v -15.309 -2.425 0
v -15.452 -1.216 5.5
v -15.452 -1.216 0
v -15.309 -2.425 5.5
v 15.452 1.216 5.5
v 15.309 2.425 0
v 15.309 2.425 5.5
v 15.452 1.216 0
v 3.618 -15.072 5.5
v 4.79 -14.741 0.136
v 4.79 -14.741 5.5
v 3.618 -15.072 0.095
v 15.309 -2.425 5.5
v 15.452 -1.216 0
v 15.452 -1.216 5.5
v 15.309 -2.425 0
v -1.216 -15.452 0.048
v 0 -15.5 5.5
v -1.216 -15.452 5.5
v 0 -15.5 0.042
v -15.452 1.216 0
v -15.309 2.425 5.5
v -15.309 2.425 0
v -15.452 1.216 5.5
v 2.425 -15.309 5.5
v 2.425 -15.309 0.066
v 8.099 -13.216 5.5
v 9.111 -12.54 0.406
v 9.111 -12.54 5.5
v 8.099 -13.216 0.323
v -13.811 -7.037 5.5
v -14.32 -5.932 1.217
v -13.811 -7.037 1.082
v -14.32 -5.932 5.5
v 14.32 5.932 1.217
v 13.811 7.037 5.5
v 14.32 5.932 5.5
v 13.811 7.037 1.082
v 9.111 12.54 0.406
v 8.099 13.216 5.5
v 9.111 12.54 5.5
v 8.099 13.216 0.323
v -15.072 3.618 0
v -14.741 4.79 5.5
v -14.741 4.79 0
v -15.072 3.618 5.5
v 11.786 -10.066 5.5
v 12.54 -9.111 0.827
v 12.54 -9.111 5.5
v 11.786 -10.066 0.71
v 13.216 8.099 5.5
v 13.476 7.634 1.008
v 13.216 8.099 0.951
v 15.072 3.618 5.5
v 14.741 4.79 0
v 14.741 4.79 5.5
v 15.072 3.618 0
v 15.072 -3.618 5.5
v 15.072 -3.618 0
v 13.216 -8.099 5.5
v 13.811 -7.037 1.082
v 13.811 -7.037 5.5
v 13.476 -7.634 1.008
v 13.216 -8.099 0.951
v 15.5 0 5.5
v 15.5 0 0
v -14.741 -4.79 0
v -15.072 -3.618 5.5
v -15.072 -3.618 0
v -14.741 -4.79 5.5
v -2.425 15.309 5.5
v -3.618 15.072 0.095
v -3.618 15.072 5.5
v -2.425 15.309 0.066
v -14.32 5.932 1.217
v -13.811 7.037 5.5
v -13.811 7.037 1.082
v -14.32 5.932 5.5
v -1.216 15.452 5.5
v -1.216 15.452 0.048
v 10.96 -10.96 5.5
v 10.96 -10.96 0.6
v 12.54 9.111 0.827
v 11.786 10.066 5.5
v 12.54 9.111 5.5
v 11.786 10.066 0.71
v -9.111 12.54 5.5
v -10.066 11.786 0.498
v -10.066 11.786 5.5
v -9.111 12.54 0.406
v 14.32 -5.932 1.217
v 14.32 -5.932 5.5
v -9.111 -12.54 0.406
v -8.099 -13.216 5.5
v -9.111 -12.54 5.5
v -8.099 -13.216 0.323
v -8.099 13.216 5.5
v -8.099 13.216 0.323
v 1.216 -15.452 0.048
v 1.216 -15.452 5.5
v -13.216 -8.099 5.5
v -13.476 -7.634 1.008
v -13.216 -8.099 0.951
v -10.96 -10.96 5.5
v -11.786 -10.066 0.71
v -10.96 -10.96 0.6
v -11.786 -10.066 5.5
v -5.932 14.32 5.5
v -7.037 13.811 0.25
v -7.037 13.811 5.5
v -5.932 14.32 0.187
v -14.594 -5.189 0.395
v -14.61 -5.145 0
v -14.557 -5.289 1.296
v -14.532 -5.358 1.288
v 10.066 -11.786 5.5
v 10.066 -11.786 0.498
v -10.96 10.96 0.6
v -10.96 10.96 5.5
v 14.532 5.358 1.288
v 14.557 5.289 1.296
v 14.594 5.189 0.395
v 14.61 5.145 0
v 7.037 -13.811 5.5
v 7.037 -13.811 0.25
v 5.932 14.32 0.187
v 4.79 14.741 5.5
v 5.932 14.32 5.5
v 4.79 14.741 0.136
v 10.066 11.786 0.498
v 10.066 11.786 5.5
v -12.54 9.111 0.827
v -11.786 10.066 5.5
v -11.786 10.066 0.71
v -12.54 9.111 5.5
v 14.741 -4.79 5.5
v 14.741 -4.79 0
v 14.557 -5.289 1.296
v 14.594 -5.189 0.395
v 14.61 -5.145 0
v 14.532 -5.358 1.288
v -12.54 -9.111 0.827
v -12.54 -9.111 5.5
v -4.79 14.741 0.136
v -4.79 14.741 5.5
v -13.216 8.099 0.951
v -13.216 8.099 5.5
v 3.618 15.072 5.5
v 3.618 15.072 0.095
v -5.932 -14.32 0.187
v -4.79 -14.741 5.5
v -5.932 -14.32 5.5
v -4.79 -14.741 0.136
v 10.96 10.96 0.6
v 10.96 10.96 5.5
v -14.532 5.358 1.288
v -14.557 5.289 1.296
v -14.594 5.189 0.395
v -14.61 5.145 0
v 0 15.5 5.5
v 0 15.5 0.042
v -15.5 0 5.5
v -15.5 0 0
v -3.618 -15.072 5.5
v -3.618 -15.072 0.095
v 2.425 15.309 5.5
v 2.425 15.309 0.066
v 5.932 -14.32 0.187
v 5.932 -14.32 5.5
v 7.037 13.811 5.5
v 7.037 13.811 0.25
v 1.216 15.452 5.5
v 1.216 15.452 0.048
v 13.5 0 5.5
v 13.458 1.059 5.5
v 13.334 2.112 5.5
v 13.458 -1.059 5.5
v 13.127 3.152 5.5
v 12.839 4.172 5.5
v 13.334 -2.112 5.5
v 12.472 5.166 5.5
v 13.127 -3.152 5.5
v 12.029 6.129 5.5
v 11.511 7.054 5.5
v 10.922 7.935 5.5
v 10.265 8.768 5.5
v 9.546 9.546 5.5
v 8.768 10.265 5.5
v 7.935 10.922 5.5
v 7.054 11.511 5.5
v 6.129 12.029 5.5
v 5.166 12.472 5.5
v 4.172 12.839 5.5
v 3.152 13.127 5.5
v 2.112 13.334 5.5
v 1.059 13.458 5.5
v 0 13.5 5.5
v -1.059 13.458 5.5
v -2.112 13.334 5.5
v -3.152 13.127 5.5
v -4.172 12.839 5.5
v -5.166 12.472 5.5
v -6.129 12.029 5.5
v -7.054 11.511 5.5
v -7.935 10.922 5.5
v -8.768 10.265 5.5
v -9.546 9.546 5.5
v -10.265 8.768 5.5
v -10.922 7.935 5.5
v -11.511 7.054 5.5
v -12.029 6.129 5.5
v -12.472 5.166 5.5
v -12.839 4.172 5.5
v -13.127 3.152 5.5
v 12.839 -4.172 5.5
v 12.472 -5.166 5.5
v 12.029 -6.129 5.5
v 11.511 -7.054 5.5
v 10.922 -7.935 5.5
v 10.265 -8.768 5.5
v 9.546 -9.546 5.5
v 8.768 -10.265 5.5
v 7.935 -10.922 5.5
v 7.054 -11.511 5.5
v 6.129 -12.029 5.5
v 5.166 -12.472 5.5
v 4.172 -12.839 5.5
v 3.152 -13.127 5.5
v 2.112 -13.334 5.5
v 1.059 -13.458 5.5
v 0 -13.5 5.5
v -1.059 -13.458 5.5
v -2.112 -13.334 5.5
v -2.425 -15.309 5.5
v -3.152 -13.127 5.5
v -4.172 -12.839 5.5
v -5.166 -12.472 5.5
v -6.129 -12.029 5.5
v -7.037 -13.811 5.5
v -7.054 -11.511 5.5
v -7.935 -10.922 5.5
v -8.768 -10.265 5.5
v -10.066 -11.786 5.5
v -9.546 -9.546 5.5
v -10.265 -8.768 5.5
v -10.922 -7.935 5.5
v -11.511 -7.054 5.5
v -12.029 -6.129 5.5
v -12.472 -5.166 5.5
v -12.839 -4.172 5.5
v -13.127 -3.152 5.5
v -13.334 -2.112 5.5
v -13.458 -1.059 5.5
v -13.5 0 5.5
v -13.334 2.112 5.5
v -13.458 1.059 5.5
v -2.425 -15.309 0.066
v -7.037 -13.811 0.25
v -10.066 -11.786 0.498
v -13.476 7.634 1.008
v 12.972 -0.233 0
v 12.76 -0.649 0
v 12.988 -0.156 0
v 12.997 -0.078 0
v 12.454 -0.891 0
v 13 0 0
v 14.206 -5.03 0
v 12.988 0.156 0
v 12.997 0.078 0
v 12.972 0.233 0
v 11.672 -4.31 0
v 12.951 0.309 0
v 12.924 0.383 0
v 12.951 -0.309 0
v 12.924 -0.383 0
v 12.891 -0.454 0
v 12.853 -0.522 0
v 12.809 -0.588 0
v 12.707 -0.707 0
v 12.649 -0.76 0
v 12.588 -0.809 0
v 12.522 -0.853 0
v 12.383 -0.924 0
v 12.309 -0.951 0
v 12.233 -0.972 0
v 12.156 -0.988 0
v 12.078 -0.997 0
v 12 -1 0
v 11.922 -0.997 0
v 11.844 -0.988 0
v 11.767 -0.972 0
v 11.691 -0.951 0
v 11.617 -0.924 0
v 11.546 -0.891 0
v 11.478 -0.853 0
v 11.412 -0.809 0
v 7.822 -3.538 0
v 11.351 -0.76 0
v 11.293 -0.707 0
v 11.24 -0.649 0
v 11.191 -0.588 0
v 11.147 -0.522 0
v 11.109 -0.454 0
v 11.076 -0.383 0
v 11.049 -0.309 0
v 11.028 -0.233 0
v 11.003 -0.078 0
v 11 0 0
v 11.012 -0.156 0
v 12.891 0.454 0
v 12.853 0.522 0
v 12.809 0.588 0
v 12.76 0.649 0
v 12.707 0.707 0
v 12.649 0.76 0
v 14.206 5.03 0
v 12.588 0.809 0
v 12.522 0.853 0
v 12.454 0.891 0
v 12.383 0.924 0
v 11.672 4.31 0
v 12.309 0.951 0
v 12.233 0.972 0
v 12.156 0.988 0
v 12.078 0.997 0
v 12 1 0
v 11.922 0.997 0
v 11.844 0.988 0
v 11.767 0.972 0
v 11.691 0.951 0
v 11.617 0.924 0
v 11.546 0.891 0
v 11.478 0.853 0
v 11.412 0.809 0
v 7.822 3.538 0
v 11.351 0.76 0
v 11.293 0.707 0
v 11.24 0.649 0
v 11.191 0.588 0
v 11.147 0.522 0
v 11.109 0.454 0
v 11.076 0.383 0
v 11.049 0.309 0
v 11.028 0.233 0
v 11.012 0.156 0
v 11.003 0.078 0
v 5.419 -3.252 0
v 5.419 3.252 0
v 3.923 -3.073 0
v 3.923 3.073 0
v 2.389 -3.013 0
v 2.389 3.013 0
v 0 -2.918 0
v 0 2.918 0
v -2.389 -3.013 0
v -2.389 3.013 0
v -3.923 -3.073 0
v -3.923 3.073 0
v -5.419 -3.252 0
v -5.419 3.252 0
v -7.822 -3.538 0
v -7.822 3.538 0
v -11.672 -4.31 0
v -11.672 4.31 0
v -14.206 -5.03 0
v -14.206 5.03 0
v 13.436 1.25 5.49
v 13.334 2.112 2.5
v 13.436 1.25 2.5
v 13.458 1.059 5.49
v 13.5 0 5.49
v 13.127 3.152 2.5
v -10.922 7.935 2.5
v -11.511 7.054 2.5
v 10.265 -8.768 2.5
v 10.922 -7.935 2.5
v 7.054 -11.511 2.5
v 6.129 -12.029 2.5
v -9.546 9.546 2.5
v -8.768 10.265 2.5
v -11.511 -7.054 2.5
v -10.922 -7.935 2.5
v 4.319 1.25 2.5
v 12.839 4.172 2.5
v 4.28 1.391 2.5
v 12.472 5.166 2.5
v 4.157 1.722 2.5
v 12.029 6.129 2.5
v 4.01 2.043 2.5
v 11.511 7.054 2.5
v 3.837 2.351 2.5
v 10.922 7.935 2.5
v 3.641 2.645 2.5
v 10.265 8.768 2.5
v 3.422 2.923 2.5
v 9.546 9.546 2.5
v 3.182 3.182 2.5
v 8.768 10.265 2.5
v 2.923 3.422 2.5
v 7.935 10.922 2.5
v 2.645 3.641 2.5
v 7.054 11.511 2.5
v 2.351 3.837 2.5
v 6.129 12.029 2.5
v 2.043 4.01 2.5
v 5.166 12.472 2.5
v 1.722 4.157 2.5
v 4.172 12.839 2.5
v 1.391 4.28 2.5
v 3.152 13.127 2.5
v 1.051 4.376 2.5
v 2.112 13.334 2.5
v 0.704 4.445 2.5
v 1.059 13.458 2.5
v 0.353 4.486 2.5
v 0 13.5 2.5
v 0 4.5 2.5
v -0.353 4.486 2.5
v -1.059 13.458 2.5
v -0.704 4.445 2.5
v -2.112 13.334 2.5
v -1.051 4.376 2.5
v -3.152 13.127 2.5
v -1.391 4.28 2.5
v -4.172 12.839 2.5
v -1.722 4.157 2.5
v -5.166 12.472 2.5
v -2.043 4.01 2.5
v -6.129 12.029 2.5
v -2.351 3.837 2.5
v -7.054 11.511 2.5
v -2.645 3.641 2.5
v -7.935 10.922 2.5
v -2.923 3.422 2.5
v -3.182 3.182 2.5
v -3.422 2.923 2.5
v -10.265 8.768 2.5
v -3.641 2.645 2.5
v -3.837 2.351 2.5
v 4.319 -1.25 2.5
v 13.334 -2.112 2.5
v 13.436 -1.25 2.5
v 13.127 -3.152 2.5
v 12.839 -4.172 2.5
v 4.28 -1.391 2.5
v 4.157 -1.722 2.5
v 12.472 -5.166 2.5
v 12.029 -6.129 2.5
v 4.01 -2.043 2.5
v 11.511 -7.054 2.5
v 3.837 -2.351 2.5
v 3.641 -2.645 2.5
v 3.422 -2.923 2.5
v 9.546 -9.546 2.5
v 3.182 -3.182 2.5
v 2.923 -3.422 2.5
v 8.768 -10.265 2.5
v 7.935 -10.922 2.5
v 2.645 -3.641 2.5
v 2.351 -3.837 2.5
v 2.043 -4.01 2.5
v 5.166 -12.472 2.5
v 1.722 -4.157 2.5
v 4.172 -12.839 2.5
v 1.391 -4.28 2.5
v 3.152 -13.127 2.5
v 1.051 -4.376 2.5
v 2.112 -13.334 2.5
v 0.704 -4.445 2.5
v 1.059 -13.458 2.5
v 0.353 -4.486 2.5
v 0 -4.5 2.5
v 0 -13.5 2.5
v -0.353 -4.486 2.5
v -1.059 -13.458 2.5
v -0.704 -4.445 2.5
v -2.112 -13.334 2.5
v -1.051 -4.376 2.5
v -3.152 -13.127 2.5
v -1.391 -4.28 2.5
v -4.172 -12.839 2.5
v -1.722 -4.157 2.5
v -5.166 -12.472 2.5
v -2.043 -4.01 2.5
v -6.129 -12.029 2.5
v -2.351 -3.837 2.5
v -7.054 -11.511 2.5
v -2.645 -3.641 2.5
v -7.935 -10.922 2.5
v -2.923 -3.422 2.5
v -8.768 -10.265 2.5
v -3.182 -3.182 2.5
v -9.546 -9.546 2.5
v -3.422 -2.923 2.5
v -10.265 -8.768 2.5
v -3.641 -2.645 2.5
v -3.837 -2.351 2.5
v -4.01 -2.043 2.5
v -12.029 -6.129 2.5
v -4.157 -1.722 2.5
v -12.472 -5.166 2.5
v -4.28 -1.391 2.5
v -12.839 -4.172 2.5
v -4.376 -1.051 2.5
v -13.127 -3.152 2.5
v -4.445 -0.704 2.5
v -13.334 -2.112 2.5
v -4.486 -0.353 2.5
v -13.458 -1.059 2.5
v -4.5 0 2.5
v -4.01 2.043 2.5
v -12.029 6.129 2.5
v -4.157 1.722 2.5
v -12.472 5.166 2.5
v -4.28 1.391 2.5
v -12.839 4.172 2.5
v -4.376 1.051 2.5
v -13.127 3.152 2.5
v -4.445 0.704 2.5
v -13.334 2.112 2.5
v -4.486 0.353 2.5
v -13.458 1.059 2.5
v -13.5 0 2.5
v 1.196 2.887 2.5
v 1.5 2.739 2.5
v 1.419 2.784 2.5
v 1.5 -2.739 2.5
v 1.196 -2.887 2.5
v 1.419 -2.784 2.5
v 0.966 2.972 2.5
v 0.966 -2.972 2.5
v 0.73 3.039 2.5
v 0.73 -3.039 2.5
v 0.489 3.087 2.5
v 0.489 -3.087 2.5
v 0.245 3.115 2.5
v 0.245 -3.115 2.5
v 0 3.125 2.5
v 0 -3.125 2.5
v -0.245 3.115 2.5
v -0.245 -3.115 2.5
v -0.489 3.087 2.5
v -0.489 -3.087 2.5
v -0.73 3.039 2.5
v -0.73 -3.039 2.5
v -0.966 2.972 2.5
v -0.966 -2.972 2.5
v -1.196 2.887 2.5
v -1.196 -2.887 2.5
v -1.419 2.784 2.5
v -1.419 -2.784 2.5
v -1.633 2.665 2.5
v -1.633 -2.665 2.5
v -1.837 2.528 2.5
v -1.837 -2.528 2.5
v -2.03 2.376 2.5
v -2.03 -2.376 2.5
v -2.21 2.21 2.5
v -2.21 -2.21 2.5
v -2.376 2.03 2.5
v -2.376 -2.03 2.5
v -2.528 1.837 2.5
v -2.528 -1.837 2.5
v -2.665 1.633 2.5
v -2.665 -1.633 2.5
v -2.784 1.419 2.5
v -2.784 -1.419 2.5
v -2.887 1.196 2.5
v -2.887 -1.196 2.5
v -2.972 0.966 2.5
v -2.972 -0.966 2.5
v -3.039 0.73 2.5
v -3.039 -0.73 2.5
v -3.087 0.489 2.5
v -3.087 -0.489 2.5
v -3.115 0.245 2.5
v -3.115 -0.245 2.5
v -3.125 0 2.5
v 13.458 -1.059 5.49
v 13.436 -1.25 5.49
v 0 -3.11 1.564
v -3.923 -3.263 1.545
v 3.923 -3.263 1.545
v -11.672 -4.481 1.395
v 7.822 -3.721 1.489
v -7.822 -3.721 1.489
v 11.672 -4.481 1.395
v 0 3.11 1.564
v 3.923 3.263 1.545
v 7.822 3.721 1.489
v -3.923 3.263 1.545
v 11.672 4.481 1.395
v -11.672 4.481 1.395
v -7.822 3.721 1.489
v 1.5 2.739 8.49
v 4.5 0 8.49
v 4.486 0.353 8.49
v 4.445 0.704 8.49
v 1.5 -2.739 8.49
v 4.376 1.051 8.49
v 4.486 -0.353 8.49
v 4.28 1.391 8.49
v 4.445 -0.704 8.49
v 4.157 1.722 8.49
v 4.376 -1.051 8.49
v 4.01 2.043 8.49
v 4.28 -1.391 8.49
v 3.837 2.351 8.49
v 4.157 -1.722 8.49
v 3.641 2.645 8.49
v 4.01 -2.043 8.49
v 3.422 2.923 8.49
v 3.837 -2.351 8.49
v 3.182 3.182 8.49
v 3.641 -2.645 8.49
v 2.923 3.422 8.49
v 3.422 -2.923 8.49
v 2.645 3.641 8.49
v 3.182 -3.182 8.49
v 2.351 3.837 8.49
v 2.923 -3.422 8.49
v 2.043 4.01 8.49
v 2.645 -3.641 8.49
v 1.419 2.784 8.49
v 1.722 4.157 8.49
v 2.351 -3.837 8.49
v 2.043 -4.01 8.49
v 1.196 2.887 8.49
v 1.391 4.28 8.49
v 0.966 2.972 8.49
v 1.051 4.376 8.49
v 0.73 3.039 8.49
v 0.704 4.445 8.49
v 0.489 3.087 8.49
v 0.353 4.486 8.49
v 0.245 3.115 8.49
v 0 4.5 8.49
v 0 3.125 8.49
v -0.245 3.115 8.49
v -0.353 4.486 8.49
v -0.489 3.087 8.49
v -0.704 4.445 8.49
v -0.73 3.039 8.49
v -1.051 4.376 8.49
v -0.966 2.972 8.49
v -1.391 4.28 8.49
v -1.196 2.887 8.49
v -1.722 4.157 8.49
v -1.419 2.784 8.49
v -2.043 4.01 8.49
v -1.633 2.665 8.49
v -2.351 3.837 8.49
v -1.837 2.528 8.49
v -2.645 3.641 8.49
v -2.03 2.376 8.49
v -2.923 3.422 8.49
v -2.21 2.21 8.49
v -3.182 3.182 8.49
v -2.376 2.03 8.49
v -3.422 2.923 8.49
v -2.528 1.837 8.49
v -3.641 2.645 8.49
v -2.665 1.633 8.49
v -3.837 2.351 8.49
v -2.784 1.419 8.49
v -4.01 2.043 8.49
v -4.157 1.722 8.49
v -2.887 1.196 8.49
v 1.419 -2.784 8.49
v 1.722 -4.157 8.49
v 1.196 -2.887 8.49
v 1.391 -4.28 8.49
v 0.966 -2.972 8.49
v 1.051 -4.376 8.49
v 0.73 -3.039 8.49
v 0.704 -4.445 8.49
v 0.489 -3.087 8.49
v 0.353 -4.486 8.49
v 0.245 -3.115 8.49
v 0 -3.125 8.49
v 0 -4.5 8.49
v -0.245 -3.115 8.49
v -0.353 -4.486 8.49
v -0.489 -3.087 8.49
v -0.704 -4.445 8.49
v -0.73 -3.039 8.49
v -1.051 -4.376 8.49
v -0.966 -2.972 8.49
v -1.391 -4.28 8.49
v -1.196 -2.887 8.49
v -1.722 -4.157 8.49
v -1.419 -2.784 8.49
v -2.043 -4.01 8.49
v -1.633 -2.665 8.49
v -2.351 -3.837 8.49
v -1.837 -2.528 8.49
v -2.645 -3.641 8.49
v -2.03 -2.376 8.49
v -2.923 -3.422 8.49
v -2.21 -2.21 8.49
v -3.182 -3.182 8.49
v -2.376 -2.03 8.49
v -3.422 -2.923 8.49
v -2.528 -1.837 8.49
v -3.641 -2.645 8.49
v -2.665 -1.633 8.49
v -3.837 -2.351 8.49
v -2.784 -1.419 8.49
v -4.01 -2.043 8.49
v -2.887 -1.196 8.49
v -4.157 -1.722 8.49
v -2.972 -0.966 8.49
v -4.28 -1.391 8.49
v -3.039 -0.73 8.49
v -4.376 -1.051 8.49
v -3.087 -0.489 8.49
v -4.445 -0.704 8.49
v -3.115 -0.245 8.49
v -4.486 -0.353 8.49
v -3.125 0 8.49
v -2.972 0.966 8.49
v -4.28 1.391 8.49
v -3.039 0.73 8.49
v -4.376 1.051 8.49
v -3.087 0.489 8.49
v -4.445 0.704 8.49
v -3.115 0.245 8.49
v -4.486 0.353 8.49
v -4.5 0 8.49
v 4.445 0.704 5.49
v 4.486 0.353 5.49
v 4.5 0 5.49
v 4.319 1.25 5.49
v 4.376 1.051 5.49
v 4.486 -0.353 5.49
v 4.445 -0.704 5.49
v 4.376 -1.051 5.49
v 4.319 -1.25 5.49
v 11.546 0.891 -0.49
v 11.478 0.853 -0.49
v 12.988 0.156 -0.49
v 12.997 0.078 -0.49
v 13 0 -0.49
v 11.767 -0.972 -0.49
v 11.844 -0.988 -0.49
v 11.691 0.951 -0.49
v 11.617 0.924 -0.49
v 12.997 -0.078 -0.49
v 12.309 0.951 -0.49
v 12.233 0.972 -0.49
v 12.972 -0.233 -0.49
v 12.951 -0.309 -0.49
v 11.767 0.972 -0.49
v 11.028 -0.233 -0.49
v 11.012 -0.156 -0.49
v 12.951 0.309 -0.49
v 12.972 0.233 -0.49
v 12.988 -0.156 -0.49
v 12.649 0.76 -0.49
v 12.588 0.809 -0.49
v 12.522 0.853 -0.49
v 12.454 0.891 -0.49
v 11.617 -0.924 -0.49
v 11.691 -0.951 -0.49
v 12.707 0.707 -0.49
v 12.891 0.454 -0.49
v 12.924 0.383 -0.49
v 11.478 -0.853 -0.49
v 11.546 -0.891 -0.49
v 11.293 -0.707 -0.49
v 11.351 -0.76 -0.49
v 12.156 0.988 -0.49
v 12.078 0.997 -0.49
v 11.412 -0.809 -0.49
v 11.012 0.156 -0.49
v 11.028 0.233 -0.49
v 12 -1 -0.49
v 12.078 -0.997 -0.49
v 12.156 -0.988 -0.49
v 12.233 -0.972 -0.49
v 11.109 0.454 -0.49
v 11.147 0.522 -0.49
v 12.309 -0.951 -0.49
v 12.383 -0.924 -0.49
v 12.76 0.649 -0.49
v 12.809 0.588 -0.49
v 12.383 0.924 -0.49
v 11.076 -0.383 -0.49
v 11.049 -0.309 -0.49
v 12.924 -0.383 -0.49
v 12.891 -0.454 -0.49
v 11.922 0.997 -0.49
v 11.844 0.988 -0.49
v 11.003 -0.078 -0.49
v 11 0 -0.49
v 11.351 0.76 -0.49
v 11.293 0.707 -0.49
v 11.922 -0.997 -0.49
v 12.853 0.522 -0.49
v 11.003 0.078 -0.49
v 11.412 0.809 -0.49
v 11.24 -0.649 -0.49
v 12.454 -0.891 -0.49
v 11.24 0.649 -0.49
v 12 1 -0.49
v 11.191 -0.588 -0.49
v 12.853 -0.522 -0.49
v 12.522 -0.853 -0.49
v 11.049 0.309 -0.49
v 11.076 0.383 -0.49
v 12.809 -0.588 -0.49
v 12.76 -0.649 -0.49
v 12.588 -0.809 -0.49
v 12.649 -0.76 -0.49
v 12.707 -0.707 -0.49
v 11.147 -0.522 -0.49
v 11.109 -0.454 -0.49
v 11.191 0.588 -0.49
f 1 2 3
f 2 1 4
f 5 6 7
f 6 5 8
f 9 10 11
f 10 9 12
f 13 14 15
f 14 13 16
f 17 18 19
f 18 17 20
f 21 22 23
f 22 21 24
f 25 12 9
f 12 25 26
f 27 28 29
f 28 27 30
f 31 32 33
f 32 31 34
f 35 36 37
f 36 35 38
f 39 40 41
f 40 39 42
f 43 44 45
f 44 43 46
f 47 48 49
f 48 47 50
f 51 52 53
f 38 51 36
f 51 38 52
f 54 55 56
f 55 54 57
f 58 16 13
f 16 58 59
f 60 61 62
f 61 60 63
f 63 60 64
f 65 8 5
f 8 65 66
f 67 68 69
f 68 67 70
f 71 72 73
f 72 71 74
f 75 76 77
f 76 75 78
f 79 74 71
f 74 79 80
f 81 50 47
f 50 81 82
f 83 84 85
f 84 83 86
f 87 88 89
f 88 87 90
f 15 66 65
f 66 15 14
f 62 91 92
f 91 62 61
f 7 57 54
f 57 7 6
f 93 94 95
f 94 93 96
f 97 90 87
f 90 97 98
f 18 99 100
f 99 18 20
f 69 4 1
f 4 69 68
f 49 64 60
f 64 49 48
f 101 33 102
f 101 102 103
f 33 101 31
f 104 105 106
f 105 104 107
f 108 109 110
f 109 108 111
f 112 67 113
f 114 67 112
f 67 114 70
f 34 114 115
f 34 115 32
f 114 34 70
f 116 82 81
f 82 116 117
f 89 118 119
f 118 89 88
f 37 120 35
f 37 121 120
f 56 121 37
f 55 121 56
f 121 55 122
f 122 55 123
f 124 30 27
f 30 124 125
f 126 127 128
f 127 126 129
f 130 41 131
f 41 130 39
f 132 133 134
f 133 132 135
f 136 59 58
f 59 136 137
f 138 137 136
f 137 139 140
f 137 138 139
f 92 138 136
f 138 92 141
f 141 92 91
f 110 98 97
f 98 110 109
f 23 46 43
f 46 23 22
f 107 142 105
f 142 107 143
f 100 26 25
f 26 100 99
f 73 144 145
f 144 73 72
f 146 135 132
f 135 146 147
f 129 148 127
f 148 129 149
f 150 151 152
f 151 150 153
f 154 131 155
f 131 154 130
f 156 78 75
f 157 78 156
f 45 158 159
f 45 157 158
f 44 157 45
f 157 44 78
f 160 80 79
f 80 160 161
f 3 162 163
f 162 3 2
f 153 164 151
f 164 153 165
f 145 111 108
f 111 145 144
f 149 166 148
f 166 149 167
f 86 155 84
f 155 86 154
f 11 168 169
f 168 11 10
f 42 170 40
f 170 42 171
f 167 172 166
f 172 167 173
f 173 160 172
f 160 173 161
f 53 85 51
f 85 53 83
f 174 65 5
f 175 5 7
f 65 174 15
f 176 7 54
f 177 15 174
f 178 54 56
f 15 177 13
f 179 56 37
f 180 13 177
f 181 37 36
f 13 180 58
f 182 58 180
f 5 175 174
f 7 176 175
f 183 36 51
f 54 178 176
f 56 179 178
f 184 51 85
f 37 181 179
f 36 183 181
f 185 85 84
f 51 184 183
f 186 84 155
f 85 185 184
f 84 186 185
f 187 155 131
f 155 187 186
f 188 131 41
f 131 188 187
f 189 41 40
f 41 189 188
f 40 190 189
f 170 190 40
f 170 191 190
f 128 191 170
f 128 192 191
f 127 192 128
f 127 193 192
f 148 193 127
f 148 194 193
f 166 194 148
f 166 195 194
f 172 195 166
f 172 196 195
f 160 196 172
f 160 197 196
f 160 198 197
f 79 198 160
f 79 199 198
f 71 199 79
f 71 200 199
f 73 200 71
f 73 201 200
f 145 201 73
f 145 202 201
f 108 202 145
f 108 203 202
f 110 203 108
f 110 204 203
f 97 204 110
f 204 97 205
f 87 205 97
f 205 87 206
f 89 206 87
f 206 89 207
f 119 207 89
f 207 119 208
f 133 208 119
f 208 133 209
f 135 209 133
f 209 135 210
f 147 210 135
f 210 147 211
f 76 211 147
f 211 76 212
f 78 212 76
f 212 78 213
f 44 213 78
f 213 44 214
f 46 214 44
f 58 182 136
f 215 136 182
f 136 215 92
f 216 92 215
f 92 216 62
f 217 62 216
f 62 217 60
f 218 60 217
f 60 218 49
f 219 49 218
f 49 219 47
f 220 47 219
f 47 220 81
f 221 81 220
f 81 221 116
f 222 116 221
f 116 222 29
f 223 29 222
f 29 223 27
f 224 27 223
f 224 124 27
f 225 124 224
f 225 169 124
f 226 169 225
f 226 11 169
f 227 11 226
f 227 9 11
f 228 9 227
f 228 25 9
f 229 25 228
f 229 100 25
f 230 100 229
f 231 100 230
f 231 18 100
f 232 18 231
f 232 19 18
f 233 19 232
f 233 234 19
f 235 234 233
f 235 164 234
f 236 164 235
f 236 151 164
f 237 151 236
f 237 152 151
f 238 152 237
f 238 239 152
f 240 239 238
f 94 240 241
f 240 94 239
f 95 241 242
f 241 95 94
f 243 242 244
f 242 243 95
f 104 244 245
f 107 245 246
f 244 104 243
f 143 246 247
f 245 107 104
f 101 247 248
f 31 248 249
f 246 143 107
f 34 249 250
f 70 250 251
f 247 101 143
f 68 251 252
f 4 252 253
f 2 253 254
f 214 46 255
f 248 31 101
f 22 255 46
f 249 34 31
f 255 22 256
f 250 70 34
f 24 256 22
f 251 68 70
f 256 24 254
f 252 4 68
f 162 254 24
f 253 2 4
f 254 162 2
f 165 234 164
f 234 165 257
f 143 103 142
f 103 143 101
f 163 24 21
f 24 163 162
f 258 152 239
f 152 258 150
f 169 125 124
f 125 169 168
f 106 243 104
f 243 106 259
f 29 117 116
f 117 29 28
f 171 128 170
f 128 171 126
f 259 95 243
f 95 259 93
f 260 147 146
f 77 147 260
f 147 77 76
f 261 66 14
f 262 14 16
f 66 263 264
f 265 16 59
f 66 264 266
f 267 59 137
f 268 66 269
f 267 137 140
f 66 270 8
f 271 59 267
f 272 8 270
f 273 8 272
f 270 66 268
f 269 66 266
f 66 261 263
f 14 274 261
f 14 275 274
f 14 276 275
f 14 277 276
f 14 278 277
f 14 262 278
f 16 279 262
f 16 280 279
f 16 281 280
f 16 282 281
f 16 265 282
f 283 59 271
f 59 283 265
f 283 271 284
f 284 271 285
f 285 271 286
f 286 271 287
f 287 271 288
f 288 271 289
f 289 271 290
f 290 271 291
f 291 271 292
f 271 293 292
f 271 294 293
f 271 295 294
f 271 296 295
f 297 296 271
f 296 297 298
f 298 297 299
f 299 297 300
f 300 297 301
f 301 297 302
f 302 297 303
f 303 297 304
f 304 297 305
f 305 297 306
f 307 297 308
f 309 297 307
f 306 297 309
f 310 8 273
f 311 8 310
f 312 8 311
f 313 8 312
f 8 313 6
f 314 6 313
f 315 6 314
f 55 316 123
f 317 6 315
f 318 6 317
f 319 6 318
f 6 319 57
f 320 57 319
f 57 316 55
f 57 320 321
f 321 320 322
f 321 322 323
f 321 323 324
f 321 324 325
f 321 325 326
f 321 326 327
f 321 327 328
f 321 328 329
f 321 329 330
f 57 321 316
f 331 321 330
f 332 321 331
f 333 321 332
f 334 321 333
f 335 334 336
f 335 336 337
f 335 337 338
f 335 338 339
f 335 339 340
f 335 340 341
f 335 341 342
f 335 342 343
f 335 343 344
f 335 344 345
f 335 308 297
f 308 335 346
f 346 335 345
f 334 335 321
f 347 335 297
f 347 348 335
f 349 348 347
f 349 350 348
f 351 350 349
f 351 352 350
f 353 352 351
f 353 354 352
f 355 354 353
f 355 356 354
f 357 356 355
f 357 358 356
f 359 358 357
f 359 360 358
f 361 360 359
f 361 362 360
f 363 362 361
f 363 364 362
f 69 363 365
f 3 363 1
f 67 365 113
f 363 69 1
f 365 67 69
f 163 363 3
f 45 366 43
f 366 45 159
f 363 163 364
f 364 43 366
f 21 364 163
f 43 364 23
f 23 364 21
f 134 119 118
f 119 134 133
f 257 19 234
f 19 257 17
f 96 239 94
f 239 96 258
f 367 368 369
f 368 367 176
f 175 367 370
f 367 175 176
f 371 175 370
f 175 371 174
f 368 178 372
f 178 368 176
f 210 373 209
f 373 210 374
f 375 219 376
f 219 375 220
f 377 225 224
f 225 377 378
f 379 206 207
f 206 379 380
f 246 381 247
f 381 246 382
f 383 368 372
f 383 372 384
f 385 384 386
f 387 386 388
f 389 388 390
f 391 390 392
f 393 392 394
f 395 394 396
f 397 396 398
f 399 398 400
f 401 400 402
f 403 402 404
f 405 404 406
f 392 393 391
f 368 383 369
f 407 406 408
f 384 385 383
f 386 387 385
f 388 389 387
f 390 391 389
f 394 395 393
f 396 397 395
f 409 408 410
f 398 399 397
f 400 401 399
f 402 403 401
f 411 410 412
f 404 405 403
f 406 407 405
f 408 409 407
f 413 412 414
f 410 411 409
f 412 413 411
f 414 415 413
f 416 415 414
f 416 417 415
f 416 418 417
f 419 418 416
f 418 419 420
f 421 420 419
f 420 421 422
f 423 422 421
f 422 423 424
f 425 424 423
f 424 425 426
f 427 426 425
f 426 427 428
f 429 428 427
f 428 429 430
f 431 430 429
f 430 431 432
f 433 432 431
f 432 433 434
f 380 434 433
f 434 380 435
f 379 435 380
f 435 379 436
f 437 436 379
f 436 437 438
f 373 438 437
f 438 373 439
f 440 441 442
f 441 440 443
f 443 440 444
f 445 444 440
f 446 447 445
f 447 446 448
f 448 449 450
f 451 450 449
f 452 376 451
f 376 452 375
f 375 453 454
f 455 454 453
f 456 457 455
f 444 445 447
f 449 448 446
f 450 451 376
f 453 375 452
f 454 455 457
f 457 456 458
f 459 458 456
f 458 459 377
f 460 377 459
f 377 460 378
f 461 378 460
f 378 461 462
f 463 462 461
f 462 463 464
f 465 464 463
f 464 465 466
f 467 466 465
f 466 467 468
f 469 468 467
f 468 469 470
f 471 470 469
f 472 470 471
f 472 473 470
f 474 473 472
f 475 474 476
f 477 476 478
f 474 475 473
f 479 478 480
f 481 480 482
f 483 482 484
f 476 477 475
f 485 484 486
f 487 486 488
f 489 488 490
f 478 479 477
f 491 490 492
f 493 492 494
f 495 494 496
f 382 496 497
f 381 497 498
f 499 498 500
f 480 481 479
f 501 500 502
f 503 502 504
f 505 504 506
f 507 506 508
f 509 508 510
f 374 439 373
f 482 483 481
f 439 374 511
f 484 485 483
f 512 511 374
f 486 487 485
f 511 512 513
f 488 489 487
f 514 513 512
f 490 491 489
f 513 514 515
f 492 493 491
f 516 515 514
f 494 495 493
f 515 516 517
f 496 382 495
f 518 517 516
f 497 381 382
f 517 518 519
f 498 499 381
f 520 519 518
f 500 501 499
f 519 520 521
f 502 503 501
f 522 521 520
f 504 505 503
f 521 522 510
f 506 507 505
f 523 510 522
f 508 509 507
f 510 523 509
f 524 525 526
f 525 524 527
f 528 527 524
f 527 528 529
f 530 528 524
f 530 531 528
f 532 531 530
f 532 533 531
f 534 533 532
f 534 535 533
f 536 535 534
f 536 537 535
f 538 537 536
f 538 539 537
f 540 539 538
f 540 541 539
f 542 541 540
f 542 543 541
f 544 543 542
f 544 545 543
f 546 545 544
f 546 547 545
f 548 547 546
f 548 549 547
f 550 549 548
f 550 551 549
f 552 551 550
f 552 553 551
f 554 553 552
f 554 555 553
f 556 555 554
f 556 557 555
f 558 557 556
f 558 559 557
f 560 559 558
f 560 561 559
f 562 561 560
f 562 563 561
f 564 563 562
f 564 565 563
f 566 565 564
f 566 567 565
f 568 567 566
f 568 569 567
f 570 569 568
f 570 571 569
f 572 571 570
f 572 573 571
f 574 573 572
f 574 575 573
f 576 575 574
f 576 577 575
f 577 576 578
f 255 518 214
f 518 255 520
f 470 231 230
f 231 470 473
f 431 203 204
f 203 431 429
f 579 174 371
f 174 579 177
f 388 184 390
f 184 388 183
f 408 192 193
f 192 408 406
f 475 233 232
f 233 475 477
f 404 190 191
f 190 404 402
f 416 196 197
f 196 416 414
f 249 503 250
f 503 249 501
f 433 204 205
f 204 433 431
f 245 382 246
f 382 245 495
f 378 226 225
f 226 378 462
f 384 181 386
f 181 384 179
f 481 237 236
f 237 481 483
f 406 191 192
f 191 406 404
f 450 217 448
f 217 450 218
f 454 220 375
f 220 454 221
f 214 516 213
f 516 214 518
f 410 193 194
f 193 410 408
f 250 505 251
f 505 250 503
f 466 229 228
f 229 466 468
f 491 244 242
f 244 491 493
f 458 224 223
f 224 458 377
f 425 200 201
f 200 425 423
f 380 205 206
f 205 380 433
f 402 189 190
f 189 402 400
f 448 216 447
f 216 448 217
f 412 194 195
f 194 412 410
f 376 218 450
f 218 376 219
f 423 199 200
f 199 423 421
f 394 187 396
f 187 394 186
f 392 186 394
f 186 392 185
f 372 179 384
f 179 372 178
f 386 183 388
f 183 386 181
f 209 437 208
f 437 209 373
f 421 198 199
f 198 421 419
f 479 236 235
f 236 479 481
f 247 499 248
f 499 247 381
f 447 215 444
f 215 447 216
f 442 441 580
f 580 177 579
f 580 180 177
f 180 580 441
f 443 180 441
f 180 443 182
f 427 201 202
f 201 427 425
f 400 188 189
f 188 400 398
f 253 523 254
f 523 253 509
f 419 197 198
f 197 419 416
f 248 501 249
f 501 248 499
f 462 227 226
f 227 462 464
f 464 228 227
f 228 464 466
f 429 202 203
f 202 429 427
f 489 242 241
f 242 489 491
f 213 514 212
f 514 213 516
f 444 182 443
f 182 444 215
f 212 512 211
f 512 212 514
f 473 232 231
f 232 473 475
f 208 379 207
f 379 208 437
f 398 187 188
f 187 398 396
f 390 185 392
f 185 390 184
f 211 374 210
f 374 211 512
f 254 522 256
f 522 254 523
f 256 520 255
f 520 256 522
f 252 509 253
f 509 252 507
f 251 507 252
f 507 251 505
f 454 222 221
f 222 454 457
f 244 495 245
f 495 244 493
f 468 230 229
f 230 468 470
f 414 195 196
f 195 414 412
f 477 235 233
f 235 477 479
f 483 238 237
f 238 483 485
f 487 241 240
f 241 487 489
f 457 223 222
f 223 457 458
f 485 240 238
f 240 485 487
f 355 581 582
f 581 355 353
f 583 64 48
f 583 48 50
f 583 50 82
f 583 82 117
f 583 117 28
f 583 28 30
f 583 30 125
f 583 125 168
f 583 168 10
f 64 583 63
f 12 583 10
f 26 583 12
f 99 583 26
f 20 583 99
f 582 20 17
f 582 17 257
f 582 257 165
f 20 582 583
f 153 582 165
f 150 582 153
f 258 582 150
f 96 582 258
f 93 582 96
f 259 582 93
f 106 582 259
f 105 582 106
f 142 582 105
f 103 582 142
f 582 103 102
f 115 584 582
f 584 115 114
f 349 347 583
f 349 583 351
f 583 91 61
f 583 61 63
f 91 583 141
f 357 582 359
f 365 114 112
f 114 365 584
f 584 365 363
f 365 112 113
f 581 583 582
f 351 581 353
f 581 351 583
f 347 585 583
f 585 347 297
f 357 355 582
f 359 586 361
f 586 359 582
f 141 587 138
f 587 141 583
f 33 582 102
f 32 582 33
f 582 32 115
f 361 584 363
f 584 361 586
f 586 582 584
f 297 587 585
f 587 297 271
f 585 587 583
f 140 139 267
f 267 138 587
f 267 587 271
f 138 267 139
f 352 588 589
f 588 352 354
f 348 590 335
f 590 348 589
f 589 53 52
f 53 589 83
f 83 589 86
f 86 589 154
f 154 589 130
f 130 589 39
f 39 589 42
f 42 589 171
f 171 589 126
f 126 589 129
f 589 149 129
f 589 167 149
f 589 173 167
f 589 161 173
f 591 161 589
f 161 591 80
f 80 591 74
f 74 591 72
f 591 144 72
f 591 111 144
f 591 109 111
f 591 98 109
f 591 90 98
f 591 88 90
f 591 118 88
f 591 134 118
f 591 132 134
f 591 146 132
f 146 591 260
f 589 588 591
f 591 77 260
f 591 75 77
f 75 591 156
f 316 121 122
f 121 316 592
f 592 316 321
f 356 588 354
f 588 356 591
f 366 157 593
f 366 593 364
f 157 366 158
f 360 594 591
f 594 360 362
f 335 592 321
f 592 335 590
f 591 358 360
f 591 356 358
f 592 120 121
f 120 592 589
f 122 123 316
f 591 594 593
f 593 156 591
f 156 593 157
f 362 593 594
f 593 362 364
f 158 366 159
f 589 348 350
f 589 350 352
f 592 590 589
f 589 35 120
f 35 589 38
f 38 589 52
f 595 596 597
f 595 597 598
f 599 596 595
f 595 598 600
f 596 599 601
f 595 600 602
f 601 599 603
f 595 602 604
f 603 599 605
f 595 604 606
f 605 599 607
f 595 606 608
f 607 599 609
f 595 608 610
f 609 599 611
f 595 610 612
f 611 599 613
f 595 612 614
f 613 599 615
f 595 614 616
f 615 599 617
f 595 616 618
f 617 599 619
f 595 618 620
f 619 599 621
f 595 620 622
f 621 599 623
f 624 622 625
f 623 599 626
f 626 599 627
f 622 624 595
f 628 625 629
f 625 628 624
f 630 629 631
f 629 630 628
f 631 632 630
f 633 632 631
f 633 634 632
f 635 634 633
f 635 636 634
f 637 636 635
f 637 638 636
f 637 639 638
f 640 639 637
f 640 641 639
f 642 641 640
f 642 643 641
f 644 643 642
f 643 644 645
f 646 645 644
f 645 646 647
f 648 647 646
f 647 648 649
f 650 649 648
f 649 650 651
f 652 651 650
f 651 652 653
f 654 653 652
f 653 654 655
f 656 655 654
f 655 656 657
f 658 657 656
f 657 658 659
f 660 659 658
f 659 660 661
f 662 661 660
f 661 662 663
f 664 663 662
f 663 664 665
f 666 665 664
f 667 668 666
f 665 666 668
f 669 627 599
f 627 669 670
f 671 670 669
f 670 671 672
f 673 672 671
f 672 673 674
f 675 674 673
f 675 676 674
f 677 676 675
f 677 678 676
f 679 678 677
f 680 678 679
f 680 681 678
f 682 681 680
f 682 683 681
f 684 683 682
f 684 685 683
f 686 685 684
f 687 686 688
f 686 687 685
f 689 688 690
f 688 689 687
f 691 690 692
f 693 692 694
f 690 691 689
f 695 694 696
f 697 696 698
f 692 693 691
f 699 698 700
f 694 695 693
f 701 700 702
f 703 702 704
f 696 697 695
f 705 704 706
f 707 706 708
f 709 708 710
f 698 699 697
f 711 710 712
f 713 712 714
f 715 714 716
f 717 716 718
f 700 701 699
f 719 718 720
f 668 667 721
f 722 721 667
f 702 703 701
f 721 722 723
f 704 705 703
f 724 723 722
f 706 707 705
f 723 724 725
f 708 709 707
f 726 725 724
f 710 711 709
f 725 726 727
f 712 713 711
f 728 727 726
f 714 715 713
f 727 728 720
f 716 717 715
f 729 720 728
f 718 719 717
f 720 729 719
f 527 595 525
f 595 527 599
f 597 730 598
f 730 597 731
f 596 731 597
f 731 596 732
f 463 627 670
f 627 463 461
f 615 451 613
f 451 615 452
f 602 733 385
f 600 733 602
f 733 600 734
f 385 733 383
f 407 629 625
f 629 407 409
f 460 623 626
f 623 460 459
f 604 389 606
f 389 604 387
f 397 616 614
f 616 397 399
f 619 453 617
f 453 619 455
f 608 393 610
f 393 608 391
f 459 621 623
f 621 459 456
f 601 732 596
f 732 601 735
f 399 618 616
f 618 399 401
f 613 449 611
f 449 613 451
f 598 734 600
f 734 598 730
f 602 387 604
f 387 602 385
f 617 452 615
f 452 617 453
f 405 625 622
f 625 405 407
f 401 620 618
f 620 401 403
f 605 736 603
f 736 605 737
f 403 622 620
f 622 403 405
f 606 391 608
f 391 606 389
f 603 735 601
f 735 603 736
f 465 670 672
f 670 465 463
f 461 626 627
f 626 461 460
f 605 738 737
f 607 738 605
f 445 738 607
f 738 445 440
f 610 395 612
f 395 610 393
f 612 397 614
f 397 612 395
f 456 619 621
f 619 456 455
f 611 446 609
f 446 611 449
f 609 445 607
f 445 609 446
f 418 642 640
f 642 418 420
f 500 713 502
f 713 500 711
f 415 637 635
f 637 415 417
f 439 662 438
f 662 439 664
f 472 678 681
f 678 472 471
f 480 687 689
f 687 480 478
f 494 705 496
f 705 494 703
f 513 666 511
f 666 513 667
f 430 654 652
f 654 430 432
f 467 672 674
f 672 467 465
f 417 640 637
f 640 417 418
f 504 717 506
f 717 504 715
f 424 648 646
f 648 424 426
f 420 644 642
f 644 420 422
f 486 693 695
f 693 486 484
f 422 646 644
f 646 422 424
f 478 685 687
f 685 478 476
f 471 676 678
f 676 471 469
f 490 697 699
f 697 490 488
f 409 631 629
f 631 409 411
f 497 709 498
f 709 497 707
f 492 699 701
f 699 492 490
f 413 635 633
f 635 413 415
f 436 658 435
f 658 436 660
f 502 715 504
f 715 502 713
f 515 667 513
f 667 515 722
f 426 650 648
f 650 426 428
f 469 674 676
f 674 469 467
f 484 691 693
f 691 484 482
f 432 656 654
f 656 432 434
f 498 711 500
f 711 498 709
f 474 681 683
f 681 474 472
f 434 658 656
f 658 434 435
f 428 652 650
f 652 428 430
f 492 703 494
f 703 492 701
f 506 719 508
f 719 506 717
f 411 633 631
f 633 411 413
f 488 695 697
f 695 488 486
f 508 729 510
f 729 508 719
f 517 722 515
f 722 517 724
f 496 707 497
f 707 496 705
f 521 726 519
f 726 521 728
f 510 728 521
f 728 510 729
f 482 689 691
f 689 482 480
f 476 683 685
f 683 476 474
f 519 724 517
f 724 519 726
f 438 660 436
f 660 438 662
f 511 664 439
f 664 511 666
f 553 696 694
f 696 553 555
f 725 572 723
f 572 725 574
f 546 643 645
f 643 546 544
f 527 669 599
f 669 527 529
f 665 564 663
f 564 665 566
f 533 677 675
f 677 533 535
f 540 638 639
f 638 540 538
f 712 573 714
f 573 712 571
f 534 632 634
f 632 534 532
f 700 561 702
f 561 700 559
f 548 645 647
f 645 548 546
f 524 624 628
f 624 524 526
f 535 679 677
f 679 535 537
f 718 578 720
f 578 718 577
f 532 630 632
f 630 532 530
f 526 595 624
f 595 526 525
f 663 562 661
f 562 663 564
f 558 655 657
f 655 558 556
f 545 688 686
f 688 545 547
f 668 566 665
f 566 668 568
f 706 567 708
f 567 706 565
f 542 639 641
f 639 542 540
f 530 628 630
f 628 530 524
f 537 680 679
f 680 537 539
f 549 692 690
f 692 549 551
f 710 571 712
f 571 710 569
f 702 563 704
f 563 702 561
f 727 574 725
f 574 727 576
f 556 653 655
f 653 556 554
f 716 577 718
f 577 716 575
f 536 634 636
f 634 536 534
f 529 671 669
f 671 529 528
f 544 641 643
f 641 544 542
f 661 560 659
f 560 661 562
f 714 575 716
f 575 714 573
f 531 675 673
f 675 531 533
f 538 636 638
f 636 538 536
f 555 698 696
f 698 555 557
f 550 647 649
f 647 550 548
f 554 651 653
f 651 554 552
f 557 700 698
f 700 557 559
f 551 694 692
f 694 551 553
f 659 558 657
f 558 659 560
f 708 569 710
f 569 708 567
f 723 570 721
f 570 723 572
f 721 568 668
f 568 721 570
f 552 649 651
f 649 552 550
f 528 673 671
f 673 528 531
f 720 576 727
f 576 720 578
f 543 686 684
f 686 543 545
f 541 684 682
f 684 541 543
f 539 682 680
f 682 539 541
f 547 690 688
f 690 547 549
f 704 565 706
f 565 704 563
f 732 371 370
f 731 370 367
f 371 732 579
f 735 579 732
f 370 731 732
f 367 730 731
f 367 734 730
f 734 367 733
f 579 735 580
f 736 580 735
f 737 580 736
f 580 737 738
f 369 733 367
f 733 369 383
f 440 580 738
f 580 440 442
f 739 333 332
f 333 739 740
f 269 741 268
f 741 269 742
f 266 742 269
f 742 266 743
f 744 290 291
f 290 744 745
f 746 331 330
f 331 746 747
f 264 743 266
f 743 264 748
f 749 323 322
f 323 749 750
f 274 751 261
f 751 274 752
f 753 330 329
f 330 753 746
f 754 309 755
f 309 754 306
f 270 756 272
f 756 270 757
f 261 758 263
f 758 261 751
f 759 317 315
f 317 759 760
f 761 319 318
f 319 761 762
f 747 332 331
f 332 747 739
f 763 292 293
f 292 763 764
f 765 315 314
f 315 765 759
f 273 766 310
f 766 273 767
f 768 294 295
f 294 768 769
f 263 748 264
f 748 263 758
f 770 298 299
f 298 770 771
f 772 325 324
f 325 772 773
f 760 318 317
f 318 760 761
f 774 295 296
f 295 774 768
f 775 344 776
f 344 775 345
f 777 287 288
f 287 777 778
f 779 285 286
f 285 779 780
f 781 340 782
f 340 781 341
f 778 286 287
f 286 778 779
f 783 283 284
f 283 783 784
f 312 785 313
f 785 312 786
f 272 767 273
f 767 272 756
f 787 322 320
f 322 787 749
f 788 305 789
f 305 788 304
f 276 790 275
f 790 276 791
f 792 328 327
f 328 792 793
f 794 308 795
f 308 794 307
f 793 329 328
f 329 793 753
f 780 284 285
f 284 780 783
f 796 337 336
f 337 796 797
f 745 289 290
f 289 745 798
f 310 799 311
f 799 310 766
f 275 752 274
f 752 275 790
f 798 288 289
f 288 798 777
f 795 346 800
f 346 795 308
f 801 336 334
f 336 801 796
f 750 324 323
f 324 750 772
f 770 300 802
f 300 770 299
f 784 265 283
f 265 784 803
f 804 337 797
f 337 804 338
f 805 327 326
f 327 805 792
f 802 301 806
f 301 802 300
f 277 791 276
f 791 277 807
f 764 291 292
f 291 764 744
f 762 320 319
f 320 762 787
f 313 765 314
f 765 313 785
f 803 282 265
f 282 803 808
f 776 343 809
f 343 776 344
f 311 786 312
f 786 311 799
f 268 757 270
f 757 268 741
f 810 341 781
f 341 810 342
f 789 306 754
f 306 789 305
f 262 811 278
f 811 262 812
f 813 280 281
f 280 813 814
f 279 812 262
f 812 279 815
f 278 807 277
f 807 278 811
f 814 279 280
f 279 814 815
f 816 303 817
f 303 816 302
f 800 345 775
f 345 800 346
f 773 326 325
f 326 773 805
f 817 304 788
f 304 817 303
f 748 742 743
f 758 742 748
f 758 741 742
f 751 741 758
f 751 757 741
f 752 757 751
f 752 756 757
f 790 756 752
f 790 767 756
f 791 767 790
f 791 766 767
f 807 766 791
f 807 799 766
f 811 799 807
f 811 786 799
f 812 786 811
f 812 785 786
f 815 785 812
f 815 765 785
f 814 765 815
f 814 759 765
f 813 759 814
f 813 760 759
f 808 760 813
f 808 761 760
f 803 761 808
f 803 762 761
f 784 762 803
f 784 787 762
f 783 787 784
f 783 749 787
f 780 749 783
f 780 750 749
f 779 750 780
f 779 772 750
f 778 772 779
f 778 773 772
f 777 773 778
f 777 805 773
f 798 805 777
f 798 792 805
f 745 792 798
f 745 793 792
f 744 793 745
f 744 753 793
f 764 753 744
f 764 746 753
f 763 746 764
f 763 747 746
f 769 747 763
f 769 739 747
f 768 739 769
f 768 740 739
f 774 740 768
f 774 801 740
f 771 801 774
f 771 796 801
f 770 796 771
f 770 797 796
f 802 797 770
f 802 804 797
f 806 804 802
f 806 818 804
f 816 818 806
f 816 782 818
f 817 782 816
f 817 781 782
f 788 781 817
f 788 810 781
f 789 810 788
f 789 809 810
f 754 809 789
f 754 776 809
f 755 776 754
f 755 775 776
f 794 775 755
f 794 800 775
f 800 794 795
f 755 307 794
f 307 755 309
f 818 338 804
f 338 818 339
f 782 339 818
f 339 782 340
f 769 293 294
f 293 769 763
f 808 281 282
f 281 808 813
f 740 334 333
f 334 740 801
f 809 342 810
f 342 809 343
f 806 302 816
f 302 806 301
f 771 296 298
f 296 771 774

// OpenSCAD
$fn = 80;   // Render detail level

/**********************************************************************
 * Replacement temperature knob for an Adax VP11 electric panel heater
 **********************************************************************/

/* [Knob body] */
// Body height
body_height = 5.5;
// Body radius
body_radius = 15.5;

// Cavity height
cavity_height = 3.0;
// Cavity radius
cavity_radius = 13.5;
cavity_base = (body_height - cavity_height);


/* [Grips and indicator] */
// Height of the disk cut-outs used to form the grip
grip_cutout_height = 4.0;
// Y-offset of the disk cut-outs used to form the grip
grip_cutout_offset_y = 2.25;
// Z-offset of the disk cut-outs used to form the grip
grip_cutout_offset_z = -8.5;
// Radius of the disk cut-outs used to form the grip
grip_cutout_radius = 50.0;
// Angle to tilt the disk cut-outs used to form the grip
grip_cutout_angle = 7.0;

// Indicator dot height
indicator_height = 0.5;
// Indicator dot radius
indicator_radius = 1.0;
// Indicator dot x-offset from center
indicator_offset_x = 12;


/* [Connector and endstop] */
// Connector height
connector_height = 6.0;
// Connector outer radius
connector_radius_outer = 4.5;
// Connector inner radius
connector_radius_inner = 3.125;

// Key offset (x) from connector center
key_offset_x = 1.5;

// Depth (y) of the endstop
endstop_depth = 2.5;


/* [Hidden] */
fudge = 0.01; // Fudge factor used to ensure planes overlap

color("#99BB99") {
    difference() {
        // Main body
        cylinder(h = body_height, r = body_radius, center = false);

        // Back cavity
        translate([0, 0, cavity_base]) {
            cylinder(h = cavity_height + fudge, r = cavity_radius, center = false);
        }

        // Front grip - bottom
        translate([0, -grip_cutout_radius - grip_cutout_offset_y, grip_cutout_offset_z]) {
            rotate([grip_cutout_angle, 0, 0]) {
                cylinder(h = grip_cutout_height, r = grip_cutout_radius, center = false);
            }
        }

        // Front grip - top
        translate([0, grip_cutout_radius + grip_cutout_offset_y, grip_cutout_offset_z]) {
            rotate([-grip_cutout_angle, 0, 0]) {
                cylinder(h = grip_cutout_height, r = grip_cutout_radius, center = false);
            }
        }
    }
    
    translate([0, 0, cavity_base - fudge]) {
        // Shaft key
        intersection() {
            translate([key_offset_x, -connector_radius_outer, 0]) {
                cube([connector_radius_outer * 2, connector_radius_outer * 2, connector_height]);
            }
            cylinder(h = connector_height, r = connector_radius_outer, center = false);
        }

        // Coupling connector
        difference() {
            cylinder(h = connector_height,         r = connector_radius_outer, center = false);
            cylinder(h = connector_height + fudge, r = connector_radius_inner, center = false);
        }
    }

    // Endstop
    translate([connector_radius_inner, -(endstop_depth / 2), cavity_base - fudge]) {
        cube([cavity_radius - connector_radius_inner, endstop_depth, cavity_height], center = false);
    }

    // Indicator dot
    translate([indicator_offset_x, 0, -indicator_height + fudge]) {
        cylinder(h = indicator_height, r = indicator_radius, center = false);
    }
}
